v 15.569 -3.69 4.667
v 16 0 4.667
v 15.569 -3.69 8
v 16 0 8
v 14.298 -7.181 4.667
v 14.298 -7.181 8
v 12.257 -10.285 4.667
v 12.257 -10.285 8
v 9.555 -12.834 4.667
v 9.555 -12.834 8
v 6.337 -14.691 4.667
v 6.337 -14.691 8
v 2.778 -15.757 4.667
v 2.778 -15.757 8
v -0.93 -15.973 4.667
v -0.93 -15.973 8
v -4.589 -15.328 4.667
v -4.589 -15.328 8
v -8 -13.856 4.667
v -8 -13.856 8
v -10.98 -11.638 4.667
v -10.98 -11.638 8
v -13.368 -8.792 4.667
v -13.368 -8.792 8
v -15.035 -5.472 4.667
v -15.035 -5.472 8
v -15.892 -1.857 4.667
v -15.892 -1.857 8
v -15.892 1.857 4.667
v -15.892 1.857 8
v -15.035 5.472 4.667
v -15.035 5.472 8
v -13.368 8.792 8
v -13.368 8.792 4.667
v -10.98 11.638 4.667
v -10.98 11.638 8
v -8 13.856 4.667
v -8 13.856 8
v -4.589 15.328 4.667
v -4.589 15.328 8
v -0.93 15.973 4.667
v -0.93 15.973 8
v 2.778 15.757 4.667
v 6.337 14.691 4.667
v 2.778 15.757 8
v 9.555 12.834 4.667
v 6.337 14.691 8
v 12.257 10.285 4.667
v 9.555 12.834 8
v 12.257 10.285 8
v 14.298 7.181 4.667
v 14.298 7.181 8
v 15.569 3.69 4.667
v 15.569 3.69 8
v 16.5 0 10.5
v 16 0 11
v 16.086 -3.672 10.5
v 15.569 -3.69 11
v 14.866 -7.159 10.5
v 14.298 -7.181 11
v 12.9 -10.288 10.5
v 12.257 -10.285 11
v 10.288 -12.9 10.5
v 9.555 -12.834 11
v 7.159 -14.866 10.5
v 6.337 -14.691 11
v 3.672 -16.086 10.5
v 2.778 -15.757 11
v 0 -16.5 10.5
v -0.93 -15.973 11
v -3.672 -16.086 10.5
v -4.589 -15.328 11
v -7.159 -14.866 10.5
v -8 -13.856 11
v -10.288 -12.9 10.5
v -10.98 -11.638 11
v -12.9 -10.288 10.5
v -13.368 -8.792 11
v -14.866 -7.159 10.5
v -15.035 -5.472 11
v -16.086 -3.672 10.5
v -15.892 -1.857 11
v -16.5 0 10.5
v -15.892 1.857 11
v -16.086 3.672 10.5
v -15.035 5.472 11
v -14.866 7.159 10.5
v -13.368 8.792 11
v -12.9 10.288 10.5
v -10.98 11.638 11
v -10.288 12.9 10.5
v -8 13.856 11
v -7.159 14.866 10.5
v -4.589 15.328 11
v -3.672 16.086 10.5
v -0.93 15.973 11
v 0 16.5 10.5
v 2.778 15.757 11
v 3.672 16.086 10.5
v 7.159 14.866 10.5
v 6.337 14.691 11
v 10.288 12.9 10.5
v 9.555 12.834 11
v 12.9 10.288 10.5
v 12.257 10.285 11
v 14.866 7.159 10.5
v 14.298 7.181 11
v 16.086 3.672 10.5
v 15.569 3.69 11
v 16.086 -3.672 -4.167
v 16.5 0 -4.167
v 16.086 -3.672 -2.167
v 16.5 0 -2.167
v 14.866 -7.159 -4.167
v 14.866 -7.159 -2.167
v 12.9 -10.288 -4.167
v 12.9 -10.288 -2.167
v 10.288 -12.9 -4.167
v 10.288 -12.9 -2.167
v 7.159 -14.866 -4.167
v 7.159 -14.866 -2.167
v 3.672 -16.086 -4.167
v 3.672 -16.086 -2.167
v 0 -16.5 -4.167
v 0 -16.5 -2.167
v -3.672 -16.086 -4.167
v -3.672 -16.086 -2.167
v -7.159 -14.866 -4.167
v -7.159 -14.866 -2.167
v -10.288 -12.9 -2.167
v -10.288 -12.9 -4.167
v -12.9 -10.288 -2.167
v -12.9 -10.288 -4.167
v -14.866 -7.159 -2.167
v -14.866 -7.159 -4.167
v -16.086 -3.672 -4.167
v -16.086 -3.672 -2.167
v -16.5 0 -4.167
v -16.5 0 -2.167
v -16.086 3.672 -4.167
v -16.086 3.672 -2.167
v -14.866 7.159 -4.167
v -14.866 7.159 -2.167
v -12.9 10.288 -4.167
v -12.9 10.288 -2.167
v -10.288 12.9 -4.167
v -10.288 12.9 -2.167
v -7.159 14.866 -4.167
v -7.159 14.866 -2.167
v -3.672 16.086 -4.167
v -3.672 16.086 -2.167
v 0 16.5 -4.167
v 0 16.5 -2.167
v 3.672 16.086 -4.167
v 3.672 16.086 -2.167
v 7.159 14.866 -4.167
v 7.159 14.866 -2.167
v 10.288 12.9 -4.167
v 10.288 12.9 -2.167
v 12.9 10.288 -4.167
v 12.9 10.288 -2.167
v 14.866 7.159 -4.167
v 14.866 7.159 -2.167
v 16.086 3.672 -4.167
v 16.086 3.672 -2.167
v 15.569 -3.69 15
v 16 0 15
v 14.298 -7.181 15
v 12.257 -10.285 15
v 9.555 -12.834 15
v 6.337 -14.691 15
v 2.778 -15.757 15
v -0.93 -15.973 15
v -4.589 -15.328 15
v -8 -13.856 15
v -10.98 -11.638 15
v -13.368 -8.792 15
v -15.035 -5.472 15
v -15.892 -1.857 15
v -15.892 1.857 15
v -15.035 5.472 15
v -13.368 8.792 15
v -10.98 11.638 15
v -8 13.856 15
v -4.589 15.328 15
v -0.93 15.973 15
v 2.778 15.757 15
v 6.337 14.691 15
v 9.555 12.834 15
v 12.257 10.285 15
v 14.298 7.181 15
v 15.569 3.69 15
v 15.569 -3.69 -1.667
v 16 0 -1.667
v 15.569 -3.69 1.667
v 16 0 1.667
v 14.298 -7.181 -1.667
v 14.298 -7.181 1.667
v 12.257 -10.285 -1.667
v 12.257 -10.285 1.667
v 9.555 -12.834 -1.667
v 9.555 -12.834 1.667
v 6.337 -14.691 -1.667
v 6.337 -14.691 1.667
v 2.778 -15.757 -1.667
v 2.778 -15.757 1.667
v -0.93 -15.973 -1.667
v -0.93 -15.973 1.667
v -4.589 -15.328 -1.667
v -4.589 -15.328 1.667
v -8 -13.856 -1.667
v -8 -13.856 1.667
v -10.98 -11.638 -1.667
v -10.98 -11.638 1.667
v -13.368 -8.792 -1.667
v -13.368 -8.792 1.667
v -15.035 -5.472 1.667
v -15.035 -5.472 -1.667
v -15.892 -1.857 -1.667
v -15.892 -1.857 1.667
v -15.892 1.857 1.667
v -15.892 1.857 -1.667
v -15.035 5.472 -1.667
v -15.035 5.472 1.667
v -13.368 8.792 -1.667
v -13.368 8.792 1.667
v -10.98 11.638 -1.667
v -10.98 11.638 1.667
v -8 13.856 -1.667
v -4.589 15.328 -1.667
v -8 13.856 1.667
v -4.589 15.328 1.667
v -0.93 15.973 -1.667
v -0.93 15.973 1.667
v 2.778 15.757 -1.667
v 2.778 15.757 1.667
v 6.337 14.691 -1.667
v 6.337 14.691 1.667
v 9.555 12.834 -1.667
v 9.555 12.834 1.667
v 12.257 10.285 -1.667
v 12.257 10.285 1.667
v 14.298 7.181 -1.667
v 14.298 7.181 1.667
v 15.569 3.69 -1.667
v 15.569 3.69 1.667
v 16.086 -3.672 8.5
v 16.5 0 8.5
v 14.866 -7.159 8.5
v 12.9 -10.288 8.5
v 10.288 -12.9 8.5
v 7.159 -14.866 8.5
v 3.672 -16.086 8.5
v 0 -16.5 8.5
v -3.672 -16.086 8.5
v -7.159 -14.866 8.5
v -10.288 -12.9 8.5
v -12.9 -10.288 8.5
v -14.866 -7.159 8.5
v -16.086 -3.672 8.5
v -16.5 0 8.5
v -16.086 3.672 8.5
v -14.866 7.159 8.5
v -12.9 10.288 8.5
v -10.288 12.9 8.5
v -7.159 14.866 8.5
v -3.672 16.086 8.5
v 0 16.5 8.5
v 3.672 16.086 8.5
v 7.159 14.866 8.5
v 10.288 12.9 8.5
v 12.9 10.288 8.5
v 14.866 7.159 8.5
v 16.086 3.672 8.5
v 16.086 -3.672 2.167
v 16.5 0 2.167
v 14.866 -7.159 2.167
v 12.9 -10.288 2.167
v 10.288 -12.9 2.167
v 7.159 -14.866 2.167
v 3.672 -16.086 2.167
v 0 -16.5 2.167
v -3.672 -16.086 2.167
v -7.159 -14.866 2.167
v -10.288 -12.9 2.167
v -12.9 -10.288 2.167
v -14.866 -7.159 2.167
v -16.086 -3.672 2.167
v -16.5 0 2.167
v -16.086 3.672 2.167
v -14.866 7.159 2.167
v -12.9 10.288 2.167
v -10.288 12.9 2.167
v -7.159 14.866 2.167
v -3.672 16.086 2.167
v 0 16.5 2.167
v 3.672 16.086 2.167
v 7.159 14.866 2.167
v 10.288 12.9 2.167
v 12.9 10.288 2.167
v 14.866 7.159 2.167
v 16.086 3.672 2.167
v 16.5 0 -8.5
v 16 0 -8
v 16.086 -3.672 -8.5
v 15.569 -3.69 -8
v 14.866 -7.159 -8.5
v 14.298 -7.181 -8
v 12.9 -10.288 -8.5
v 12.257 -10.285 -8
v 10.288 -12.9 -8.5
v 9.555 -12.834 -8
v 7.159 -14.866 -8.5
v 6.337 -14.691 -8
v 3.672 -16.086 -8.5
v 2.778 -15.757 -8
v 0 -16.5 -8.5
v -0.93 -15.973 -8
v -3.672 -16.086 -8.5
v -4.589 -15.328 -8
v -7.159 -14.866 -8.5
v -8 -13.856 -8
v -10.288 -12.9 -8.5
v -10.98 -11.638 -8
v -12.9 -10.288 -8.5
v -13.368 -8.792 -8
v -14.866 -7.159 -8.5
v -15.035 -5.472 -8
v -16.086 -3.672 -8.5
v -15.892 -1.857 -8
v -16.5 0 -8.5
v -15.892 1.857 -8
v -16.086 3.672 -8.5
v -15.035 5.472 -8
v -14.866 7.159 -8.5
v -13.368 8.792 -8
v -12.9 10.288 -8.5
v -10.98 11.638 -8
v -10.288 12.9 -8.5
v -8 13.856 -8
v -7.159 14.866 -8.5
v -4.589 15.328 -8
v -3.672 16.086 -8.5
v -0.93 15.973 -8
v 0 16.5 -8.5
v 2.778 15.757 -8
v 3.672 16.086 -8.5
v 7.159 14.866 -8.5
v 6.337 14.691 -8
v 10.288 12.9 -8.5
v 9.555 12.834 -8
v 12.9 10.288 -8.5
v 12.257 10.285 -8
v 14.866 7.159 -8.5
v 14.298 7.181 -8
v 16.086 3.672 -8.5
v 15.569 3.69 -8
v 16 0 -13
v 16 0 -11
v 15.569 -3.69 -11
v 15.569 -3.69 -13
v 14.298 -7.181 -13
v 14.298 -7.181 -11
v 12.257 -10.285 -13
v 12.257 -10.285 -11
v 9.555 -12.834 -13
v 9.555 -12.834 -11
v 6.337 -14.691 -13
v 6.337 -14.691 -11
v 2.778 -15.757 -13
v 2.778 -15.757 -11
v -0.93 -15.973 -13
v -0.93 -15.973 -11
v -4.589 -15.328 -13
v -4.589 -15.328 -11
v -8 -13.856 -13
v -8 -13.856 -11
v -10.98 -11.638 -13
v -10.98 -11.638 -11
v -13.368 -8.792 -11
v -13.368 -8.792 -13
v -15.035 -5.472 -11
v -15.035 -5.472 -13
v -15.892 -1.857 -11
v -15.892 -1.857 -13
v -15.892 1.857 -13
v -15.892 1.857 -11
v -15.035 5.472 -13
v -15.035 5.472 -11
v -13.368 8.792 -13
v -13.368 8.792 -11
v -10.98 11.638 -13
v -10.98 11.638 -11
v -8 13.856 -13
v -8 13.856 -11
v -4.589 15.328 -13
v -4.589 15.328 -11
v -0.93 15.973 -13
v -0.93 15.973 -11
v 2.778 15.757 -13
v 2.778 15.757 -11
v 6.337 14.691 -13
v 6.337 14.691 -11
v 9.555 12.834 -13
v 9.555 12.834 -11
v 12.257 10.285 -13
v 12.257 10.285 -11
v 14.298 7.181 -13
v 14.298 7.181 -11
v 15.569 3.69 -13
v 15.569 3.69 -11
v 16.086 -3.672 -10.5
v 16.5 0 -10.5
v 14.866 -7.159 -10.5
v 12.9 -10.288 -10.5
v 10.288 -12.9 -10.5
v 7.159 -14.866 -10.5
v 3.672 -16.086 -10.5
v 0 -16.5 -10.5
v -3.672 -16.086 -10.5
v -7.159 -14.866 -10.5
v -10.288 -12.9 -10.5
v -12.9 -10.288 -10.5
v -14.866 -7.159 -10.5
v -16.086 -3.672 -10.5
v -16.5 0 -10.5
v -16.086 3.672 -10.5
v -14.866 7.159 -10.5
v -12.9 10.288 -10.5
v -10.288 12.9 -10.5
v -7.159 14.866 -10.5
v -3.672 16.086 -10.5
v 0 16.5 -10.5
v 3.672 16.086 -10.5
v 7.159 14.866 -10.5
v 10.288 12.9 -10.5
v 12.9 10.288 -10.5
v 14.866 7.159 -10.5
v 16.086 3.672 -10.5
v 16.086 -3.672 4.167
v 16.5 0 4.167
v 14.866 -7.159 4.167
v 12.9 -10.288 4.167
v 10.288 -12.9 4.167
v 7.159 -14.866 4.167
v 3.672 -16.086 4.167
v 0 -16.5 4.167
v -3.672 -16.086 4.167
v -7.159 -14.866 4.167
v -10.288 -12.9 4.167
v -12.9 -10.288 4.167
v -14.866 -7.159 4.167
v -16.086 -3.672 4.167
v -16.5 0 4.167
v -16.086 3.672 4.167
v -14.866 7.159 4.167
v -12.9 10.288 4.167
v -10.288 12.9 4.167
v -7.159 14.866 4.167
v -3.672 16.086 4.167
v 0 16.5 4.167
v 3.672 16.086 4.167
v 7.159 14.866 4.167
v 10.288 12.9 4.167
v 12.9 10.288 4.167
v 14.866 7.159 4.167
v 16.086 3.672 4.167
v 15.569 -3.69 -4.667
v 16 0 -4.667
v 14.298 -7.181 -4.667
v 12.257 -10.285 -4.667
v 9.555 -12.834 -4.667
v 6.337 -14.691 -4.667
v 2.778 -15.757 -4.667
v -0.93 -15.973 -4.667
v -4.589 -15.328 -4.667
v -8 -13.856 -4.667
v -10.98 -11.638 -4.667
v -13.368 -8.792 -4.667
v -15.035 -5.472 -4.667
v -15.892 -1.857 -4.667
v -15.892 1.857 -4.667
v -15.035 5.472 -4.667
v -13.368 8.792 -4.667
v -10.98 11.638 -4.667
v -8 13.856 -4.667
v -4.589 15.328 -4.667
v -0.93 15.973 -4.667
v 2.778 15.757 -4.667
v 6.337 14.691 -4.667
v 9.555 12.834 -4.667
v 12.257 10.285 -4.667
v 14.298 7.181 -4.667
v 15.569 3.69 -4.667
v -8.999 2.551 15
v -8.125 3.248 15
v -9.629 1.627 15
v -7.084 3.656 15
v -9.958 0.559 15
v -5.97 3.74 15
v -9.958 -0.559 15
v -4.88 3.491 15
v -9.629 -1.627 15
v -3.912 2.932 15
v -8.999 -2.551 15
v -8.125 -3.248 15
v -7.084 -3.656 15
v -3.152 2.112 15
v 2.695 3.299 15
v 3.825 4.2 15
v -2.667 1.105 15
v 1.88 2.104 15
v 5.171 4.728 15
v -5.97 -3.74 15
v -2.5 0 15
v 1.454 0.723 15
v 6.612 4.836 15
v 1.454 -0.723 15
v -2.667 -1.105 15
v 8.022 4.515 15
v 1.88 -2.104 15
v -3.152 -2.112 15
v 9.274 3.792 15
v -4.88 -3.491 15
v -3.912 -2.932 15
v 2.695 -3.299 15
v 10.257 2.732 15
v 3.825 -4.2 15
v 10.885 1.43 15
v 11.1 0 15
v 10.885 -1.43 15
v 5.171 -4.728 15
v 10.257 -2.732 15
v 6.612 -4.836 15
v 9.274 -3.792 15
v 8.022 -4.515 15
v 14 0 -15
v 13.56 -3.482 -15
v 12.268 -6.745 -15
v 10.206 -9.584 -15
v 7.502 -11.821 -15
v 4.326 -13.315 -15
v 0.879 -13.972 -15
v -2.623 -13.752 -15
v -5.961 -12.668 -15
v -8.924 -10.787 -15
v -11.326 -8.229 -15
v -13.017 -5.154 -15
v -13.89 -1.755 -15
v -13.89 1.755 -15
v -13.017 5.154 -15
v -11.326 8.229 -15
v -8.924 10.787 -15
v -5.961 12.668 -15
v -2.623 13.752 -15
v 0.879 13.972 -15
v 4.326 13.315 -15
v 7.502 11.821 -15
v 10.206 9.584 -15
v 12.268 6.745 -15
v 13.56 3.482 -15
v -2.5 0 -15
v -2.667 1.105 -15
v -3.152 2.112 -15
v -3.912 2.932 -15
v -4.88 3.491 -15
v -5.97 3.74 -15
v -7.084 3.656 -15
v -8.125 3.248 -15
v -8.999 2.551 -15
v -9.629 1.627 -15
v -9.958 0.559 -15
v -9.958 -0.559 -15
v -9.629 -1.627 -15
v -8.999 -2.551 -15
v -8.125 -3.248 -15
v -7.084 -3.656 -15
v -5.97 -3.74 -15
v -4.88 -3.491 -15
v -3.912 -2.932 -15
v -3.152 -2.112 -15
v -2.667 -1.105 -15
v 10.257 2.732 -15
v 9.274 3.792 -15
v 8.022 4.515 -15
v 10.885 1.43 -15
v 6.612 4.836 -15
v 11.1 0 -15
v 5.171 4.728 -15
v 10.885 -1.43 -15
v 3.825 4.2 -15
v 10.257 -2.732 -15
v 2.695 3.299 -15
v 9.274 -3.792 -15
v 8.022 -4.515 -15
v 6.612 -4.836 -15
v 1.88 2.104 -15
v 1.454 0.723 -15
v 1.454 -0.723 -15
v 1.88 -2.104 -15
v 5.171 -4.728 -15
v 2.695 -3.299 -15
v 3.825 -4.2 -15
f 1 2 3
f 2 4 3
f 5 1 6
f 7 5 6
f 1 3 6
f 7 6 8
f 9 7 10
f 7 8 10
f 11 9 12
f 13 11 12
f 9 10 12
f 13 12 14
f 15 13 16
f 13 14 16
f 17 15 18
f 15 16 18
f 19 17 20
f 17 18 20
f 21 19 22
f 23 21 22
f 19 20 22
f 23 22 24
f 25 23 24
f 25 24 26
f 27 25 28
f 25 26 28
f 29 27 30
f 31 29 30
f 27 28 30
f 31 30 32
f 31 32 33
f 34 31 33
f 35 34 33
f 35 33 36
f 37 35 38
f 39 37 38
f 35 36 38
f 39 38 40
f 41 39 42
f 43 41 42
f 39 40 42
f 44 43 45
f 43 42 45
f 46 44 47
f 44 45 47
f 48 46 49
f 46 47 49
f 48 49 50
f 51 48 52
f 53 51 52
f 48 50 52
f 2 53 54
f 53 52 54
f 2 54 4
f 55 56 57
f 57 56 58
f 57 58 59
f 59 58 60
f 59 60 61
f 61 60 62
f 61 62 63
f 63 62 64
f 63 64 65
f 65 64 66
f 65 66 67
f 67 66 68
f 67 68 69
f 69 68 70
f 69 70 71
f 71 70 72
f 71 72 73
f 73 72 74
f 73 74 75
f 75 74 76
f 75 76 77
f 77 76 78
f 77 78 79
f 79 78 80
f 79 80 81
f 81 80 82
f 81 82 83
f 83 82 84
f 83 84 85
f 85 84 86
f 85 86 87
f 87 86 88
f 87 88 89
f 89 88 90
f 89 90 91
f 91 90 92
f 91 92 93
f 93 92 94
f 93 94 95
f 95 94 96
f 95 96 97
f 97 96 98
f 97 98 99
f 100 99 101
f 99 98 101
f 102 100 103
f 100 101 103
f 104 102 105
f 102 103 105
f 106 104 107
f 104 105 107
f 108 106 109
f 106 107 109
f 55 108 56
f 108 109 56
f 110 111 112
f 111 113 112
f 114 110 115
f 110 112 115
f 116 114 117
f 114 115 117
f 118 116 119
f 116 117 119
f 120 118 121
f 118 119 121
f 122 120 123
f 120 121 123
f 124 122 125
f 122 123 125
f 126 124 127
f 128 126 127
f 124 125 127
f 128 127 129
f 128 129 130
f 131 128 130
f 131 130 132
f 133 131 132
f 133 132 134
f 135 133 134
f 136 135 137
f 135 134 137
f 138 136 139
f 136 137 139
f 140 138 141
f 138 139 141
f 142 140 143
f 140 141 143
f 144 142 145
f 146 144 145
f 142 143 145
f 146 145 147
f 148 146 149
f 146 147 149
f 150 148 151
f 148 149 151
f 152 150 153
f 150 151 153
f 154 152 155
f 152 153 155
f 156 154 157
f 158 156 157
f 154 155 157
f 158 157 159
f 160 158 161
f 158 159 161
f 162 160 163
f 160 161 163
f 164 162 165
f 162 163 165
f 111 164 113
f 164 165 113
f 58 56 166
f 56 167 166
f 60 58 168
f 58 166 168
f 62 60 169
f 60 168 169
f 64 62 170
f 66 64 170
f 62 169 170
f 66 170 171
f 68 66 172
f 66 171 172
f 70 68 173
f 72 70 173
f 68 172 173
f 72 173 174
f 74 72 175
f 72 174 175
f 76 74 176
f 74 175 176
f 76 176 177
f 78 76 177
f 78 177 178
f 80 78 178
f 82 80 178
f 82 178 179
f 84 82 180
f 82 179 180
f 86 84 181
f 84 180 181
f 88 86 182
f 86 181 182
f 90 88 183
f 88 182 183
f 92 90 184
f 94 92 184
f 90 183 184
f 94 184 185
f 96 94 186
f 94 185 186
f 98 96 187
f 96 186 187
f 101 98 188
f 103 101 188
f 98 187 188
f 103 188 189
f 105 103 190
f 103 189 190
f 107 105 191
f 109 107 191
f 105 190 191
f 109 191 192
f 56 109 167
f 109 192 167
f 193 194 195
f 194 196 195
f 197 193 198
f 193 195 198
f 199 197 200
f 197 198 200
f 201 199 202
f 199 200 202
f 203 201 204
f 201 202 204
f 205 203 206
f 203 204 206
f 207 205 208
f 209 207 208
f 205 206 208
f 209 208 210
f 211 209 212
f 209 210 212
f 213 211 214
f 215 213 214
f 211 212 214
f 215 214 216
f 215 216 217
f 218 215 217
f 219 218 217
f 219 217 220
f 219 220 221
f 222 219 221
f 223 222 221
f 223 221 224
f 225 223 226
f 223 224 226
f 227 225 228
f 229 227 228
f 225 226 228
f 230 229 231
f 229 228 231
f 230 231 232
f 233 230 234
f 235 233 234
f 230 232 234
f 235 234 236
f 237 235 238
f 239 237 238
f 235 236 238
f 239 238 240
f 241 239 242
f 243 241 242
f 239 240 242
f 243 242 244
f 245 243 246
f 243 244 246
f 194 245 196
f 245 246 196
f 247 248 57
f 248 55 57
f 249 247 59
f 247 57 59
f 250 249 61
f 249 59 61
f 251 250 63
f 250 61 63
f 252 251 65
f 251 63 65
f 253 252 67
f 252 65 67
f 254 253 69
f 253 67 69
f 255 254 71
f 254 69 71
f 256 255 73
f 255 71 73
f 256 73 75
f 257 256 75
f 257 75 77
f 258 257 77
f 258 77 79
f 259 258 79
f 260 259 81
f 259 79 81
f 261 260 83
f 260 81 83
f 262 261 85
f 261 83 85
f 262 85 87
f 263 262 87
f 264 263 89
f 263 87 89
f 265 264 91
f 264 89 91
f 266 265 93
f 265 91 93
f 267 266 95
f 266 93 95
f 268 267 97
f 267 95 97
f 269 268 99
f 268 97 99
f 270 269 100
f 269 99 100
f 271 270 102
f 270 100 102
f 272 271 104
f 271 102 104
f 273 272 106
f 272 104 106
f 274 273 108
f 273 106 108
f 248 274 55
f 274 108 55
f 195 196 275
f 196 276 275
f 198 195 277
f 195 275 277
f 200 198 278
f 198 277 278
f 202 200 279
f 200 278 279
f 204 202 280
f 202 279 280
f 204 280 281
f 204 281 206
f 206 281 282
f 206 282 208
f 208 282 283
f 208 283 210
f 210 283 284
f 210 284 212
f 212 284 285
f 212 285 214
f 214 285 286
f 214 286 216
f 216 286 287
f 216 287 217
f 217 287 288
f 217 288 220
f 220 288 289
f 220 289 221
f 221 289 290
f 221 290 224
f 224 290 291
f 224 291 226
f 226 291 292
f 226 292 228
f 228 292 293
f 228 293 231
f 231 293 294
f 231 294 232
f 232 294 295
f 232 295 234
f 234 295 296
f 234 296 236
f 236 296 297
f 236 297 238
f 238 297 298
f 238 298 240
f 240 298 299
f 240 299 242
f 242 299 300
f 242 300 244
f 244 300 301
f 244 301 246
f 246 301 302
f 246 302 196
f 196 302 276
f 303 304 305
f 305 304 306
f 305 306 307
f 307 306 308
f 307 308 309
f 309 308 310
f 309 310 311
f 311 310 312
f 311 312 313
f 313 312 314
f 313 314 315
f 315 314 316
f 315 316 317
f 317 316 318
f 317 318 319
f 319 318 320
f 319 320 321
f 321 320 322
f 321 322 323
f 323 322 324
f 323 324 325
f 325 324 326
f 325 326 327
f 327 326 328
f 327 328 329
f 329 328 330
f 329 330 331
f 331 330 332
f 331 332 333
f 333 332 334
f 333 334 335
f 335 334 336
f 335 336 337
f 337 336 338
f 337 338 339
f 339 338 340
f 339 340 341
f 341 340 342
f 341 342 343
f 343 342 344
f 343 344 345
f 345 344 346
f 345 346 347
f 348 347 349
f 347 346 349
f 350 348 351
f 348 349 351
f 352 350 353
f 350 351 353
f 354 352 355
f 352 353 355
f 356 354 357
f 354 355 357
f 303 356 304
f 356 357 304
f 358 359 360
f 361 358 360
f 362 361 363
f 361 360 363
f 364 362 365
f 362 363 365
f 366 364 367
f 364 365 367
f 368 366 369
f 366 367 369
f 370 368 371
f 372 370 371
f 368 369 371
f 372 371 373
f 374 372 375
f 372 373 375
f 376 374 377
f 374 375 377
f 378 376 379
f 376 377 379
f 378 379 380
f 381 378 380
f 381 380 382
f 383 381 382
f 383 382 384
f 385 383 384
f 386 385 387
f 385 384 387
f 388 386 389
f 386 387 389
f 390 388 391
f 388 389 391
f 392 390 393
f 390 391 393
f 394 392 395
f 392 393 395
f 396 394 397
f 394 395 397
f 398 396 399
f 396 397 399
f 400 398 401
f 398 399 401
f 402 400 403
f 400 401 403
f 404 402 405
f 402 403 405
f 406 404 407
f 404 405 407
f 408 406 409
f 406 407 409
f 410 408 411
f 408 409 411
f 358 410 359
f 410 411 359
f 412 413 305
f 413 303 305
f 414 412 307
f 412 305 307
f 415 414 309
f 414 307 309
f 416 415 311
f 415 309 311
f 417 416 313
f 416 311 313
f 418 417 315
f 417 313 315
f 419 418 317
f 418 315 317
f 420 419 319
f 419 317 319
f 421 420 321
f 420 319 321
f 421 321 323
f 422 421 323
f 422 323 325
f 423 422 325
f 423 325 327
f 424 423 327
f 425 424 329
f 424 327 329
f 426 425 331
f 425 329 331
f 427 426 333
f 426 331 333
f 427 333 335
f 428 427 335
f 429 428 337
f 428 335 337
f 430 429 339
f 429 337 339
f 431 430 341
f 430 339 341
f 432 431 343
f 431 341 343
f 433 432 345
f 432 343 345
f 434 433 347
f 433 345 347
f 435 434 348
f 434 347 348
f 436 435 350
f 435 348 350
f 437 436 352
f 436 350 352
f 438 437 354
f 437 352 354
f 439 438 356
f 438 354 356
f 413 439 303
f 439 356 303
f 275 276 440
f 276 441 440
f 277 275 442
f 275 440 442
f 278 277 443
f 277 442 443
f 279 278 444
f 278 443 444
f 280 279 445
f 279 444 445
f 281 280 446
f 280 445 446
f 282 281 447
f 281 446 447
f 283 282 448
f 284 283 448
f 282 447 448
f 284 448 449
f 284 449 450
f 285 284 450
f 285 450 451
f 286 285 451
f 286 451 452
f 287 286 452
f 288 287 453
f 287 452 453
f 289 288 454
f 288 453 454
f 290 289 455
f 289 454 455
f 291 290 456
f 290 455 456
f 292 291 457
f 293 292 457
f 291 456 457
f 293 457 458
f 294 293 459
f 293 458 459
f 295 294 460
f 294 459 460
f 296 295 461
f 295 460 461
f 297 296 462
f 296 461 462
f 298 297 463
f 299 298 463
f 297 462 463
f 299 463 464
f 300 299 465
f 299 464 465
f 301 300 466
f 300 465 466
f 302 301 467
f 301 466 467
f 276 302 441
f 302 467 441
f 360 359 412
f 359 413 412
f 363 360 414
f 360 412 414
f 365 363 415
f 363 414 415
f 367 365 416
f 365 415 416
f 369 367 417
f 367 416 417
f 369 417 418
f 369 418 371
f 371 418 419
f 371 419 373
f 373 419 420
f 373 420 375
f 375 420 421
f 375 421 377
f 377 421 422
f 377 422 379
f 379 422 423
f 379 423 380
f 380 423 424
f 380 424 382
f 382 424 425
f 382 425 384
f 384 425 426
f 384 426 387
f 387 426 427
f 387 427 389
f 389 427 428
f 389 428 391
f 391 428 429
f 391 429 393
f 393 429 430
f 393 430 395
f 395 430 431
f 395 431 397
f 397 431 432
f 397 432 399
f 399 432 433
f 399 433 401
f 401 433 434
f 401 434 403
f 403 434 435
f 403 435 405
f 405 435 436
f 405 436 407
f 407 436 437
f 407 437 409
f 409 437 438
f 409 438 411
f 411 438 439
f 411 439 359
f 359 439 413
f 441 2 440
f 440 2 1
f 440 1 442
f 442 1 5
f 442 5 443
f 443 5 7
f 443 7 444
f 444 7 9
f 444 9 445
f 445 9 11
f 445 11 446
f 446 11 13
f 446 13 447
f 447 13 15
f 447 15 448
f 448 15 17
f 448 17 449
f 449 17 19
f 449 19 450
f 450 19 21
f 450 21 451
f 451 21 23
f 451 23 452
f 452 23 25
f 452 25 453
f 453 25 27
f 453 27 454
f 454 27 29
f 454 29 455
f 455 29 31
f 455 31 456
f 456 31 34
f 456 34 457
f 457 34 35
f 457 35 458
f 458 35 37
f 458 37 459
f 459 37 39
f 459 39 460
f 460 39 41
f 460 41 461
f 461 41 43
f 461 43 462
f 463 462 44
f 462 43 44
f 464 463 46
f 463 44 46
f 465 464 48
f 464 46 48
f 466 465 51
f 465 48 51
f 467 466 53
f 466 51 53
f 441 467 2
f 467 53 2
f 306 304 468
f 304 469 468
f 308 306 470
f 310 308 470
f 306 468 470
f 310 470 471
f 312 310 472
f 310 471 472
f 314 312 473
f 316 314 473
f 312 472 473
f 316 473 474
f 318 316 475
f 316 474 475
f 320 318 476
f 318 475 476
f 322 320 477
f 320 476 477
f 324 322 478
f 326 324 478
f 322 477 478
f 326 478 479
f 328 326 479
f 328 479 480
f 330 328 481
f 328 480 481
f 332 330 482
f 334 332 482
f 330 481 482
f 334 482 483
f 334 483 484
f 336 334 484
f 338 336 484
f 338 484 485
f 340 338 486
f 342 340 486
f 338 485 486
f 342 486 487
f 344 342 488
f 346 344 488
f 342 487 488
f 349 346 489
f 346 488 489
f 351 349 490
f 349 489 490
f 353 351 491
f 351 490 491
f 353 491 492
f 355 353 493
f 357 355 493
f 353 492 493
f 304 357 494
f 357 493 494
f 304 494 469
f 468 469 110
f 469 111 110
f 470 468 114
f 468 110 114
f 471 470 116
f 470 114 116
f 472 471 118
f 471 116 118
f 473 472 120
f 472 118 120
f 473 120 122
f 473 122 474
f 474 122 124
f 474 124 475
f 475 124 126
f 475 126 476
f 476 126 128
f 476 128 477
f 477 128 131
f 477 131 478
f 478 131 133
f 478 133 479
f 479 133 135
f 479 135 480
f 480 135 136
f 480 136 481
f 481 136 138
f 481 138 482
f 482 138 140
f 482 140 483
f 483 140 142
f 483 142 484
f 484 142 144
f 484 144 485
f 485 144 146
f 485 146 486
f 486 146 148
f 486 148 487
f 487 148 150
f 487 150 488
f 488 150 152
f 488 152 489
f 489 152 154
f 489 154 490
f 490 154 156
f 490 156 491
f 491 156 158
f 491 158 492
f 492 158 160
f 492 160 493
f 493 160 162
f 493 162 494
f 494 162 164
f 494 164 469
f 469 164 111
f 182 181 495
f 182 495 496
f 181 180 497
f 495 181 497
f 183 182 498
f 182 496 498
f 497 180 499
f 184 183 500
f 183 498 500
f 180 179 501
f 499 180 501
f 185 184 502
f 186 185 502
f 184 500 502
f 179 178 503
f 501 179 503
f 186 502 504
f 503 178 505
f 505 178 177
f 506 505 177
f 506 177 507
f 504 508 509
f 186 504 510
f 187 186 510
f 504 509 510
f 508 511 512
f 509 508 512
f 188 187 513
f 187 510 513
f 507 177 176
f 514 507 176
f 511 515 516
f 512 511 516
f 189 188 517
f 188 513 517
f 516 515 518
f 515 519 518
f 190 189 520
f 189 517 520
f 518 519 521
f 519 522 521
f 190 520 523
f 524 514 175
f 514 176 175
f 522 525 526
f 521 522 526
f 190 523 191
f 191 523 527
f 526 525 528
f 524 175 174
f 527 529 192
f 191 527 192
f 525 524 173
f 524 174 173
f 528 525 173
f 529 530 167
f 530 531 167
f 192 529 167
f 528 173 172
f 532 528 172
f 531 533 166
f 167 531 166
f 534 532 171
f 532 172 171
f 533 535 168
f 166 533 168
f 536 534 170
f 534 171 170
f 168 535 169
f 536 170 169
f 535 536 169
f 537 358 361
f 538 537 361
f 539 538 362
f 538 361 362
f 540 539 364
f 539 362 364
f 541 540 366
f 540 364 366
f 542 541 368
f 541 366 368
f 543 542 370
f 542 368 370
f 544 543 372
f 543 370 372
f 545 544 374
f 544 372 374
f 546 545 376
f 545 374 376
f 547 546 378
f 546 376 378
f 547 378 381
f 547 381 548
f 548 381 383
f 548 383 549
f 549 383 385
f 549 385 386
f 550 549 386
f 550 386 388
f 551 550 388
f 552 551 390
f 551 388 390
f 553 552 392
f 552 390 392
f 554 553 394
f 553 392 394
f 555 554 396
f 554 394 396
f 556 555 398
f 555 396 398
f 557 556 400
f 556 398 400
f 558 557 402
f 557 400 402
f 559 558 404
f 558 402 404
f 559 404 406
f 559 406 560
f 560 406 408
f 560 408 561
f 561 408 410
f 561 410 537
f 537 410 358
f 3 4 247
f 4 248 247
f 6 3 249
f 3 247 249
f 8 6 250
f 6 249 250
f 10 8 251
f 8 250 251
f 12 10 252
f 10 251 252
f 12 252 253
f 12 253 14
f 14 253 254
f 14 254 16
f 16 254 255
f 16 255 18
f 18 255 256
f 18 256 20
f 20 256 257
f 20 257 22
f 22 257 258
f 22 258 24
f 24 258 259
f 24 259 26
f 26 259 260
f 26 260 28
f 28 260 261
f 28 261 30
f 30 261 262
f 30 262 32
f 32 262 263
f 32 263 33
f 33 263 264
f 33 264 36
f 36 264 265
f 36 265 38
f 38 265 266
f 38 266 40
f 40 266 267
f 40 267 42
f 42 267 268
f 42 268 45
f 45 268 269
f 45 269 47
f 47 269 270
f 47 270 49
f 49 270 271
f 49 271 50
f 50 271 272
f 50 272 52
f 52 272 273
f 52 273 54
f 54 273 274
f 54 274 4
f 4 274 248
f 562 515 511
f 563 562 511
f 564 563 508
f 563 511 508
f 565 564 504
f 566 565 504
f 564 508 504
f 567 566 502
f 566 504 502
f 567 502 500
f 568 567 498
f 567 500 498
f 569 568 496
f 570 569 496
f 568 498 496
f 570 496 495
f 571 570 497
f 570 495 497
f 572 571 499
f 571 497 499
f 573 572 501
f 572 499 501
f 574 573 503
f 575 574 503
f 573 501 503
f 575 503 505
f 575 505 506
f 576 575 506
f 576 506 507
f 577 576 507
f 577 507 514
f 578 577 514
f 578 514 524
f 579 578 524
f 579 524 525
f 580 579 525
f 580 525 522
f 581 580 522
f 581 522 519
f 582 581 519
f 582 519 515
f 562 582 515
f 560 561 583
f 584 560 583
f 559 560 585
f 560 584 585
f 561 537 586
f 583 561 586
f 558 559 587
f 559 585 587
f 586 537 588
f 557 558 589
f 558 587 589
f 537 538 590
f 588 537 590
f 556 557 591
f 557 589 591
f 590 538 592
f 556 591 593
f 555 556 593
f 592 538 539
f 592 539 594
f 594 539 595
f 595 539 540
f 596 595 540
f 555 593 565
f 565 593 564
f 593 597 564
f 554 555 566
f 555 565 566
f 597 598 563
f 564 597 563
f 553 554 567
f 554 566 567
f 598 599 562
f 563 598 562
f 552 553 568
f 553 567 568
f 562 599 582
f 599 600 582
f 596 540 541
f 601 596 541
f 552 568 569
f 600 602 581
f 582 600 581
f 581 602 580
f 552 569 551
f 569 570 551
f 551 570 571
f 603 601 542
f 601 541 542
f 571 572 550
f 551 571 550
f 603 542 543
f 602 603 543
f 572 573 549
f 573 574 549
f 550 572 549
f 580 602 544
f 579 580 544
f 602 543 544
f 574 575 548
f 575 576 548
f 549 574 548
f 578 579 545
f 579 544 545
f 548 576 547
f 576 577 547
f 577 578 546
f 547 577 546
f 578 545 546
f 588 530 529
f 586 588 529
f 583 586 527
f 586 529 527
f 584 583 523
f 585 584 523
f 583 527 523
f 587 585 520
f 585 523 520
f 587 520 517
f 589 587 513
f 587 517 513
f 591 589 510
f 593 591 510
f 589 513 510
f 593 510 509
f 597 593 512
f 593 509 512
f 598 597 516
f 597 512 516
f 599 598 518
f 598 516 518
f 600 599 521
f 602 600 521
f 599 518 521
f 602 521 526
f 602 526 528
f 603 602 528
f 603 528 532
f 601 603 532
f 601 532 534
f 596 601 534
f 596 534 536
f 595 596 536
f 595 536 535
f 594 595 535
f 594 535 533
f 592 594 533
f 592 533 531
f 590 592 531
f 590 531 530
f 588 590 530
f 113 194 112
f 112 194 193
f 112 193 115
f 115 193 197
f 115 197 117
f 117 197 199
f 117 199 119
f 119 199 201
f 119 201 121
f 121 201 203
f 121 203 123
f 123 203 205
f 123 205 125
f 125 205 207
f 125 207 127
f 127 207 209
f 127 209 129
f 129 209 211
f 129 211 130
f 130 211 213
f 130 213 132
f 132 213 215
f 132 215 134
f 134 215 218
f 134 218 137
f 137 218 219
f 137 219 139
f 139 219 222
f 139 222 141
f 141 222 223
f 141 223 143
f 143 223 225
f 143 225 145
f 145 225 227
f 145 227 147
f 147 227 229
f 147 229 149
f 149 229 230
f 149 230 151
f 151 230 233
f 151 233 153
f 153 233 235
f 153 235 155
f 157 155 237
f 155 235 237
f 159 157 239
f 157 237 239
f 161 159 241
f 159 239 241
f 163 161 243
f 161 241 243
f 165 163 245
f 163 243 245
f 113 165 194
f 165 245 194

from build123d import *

# Parameters (mm, degrees)
F2_R     = 3.75
F2_R_2   = 4.85
F3_DEPTH = 30.001
F4_SIZE  = 2


with BuildPart() as f1:
    # F0 (on Front) → F1 (revolve)
    with BuildSketch(Plane.XZ):
        Polygon((16, 15), (0, 15), (0, -15), (16, -15), (16, -11), (16.5, -10.5), (16.5, -8.5), (16, -8), (16, -4.666667), (16.5, -4.166667), (16.5, -2.166667), (16, -1.666667), (16, 1.666667), (16.5, 2.166667), (16.5, 4.166667), (16, 4.666667), (16, 8), (16.5, 8.5), (16.5, 10.5), (16, 11), align=None)
    revolve(axis=Axis((0, 0, 0), (0, 0, -1)))

    # F2 (on face) → F3 (cut, through all)
    with BuildSketch(Plane.XY.offset(15)):
        with Locations((-6.25, 0)):
            Circle(F2_R)
        with Locations((6.25, 0)):
            Circle(F2_R_2)
    extrude(amount=-F3_DEPTH, mode=Mode.SUBTRACT)

    # F4
    f4_edges = [f1.edges().sort_by_distance(p)[0] for p in [
        (-16, 0, -15),
    ]]
    chamfer(f4_edges, length=F4_SIZE)


solid = f1.part
